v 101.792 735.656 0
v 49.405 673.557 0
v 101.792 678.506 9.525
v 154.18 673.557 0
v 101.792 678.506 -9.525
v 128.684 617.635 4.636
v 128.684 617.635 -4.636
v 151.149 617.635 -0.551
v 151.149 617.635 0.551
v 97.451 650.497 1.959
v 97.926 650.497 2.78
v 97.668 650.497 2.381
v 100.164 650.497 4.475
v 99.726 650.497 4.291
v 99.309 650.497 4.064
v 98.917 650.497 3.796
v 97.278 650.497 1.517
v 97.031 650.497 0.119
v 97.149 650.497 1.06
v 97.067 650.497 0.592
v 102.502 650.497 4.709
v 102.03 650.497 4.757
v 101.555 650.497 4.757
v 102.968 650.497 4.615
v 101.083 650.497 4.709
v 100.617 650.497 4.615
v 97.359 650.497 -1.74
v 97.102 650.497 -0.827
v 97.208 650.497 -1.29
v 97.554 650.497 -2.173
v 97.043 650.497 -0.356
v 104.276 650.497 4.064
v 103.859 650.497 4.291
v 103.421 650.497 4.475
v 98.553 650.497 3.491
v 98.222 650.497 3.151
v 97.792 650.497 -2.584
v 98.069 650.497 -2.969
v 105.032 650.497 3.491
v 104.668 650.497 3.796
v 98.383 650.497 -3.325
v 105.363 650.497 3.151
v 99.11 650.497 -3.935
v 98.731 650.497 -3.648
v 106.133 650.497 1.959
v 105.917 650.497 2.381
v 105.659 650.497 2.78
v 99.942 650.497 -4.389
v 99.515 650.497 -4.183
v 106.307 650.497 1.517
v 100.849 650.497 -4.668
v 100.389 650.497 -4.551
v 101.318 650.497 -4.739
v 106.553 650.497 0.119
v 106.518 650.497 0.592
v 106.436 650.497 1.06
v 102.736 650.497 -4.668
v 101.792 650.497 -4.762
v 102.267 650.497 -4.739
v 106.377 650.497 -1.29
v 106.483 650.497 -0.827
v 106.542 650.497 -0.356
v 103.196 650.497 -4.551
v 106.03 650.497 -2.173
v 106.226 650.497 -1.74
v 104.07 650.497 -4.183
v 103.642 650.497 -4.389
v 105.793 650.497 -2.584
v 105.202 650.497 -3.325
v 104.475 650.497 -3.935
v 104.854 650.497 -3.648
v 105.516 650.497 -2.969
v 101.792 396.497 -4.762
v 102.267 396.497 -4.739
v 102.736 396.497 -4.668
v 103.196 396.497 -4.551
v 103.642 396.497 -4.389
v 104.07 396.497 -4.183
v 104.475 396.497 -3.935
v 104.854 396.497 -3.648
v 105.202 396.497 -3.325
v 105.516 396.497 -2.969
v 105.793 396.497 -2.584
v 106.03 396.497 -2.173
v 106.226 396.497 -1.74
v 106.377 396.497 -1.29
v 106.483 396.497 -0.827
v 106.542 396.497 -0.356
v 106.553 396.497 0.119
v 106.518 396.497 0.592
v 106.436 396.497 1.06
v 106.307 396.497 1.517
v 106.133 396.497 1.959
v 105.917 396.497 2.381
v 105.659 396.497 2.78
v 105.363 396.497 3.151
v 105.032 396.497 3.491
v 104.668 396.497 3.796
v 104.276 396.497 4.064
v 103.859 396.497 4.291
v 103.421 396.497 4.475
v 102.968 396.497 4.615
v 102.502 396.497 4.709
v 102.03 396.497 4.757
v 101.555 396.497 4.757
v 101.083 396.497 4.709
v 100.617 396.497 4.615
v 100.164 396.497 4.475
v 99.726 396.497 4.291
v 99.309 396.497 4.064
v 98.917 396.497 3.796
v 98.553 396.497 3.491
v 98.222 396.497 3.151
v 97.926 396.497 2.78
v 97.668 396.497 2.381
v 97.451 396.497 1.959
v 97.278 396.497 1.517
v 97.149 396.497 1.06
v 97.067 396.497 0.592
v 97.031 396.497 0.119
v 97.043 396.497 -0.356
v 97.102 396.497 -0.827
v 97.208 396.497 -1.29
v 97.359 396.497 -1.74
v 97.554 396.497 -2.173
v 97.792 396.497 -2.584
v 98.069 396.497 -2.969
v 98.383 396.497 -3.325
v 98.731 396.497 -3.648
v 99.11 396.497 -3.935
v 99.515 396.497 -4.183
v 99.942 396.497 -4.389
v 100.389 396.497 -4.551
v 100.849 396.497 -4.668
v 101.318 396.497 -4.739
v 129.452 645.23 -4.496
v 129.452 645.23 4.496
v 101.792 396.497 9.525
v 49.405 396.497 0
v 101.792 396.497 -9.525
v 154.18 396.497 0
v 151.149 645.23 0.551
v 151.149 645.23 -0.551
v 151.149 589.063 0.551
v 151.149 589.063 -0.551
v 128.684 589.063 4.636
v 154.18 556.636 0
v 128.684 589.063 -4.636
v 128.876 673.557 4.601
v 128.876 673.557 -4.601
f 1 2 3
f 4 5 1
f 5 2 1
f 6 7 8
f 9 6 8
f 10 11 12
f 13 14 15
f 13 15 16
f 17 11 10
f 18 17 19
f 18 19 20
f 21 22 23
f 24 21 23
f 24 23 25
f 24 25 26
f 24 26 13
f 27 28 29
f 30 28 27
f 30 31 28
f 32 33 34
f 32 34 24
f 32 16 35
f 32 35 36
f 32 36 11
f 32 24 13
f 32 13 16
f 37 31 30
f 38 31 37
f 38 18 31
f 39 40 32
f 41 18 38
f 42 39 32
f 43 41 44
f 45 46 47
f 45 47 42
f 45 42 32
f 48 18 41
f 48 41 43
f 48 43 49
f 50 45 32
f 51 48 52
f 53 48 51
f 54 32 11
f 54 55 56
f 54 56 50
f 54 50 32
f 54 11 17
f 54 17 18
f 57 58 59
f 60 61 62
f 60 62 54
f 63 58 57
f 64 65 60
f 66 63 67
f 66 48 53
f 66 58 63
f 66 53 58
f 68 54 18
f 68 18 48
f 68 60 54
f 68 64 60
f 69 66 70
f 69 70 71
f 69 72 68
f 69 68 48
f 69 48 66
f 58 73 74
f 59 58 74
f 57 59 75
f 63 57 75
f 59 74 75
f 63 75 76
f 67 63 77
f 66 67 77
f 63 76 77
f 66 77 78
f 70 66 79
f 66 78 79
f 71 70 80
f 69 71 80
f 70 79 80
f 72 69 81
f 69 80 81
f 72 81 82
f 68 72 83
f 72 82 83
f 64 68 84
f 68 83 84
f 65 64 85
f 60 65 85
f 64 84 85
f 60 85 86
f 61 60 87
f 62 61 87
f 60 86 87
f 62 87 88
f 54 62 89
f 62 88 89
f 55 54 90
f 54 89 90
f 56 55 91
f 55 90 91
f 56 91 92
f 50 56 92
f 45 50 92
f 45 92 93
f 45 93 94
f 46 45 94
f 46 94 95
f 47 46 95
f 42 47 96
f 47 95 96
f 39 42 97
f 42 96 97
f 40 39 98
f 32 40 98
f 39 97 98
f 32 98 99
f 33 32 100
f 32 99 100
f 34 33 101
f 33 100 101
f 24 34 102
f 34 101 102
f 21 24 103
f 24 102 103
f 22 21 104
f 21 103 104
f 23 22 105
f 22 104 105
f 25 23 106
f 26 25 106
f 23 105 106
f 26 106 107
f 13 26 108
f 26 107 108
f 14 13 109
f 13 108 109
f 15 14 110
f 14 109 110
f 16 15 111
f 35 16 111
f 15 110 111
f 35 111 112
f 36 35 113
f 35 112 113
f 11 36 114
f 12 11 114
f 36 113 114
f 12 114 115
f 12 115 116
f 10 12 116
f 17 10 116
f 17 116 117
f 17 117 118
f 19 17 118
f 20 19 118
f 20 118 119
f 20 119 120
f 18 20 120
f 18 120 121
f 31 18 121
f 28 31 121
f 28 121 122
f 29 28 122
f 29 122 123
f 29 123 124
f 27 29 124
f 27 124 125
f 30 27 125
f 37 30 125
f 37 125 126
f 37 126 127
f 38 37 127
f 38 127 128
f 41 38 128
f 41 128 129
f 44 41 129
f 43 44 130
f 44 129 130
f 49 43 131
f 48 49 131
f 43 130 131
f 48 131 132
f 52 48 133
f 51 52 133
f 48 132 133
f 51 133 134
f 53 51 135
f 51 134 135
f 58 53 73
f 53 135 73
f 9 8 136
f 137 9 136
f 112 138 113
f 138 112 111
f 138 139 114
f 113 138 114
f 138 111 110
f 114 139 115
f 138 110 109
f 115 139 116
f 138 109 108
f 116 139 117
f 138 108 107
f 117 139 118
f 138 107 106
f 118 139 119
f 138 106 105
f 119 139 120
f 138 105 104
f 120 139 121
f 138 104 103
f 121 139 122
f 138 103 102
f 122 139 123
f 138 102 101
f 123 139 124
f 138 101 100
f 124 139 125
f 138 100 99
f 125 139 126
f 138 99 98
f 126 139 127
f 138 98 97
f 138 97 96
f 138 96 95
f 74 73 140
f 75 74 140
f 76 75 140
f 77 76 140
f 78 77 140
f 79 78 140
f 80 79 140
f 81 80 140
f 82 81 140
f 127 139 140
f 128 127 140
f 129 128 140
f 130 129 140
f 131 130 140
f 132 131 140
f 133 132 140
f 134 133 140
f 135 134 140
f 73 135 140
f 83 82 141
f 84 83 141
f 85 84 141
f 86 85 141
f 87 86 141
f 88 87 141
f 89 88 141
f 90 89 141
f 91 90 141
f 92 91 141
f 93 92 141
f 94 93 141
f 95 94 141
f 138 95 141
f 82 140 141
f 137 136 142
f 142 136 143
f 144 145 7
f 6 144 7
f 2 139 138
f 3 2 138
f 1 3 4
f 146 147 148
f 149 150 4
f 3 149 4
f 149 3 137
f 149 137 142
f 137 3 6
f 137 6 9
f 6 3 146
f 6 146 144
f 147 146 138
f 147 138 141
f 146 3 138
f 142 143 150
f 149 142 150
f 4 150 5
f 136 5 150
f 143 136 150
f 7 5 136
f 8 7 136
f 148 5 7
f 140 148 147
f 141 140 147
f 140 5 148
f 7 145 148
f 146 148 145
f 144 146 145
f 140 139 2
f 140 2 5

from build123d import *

# Parameters (mm, degrees)
BOSS_EXTRUDE1_DEPTH      = 9.525
BOSS_EXTRUDE1_DEPTH_BACK = 9.525
CUT_EXTRUDE1_DEPTH       = 373.680910299
CUT_EXTRUDE2_DEPTH       = 373.680910299
SKETCH5_W                = 97.518379051
SKETCH5_H                = 136.419580789
CUT_EXTRUDE3_DEPTH       = 739.741184154
SKETCH6_W                = 75.100700845
SKETCH6_H                = 154.277977479
CUT_EXTRUDE4_DEPTH       = 748.678846608
SKETCH7_R                = 4.7625
CUT_EXTRUDE5_DEPTH       = 254


with BuildPart() as part:
    # Sketch1 → Boss-Extrude1 (new, two sides: drawn at the far end of the back side and taken through both)
    with BuildSketch(Plane.XY.offset(-BOSS_EXTRUDE1_DEPTH_BACK)):
        Polygon((101.792411443, 735.656458749), (49.404911443, 673.557276224), (49.404911443, 396.497366015), (154.179911443, 396.497366015), (154.179911443, 556.636391043), (128.683999881, 589.063224066), (151.148766449, 589.063224066), (128.683999881, 617.634912224), (151.148766449, 617.634912224), (129.452026088, 645.229790529), (151.148766449, 645.229790529), (128.876006433, 673.557276224), (154.179911443, 673.557276224), align=None)
    extrude(amount=BOSS_EXTRUDE1_DEPTH + BOSS_EXTRUDE1_DEPTH_BACK)

    # Sketch2 → Cut-Extrude1 (cut, through all)
    with BuildSketch(Plane(origin=(0, 396.497366015, 0), x_dir=(-1, 0, 0), z_dir=(0, -1, 0))):
        Polygon((-49.404911443, 0), (-101.792411443, -9.525), (-154.179911443, 0), (-159.65732669, 0), (-159.65732669, -13.649148588), (-44.158493861, -13.649148588), (-44.158493861, 0), align=None)
    extrude(amount=-CUT_EXTRUDE1_DEPTH, mode=Mode.SUBTRACT)

    # Sketch3 → Cut-Extrude2 (cut, through all)
    with BuildSketch(Plane.XZ.offset(-396.497366015)):
        Polygon((49.404911443, 0), (101.792411443, -9.525), (154.179911443, 0), (159.580570647, 0), (159.580570647, -14.500746269), (43.682013433, -14.500746269), (43.682013433, 0), align=None)
    extrude(amount=-CUT_EXTRUDE2_DEPTH, mode=Mode.SUBTRACT)

    # Sketch5 → Cut-Extrude3 (cut, through all)
    with BuildSketch(Plane(origin=(26.430459561, 22.297003663, 133.782021979), x_dir=(0.9815360247212257, -0.031445805879602766, -0.1886748352776165), z_dir=(0.1912773697394791, 0.16136352846789567, 0.9681811708073739))):
        with Locations((89.248369642, 700.742830845)):
            Rectangle(SKETCH5_W, SKETCH5_H)
    cut_extrude3 = extrude(amount=CUT_EXTRUDE3_DEPTH, mode=Mode.SUBTRACT)

    # Sketch6 → Cut-Extrude4 (cut, through all)
    with BuildSketch(Plane(origin=(-18.981895096, 16.01331916, 96.079914958), x_dir=(0.9815360247212258, 0.03144580587960229, 0.18867483527761636), z_dir=(-0.19127736973947887, 0.1613635284678934, 0.9681811708073744))):
        with Locations((98.873573013, 697.792784398)):
            Rectangle(SKETCH6_W, SKETCH6_H)
    cut_extrude4 = extrude(amount=CUT_EXTRUDE4_DEPTH, mode=Mode.SUBTRACT)

    # Mirror1: Cut-Extrude3, Cut-Extrude4 across plane
    add(cut_extrude3.mirror(Plane.XY), mode=Mode.SUBTRACT)
    add(cut_extrude4.mirror(Plane.XY), mode=Mode.SUBTRACT)

    # Sketch7 → Cut-Extrude5 (cut)
    with BuildSketch(Plane.XZ.offset(-396.497366015)):
        with Locations((101.792411443, 0)):
            Circle(SKETCH7_R)
    extrude(amount=-CUT_EXTRUDE5_DEPTH, mode=Mode.SUBTRACT)


solid = part.part
